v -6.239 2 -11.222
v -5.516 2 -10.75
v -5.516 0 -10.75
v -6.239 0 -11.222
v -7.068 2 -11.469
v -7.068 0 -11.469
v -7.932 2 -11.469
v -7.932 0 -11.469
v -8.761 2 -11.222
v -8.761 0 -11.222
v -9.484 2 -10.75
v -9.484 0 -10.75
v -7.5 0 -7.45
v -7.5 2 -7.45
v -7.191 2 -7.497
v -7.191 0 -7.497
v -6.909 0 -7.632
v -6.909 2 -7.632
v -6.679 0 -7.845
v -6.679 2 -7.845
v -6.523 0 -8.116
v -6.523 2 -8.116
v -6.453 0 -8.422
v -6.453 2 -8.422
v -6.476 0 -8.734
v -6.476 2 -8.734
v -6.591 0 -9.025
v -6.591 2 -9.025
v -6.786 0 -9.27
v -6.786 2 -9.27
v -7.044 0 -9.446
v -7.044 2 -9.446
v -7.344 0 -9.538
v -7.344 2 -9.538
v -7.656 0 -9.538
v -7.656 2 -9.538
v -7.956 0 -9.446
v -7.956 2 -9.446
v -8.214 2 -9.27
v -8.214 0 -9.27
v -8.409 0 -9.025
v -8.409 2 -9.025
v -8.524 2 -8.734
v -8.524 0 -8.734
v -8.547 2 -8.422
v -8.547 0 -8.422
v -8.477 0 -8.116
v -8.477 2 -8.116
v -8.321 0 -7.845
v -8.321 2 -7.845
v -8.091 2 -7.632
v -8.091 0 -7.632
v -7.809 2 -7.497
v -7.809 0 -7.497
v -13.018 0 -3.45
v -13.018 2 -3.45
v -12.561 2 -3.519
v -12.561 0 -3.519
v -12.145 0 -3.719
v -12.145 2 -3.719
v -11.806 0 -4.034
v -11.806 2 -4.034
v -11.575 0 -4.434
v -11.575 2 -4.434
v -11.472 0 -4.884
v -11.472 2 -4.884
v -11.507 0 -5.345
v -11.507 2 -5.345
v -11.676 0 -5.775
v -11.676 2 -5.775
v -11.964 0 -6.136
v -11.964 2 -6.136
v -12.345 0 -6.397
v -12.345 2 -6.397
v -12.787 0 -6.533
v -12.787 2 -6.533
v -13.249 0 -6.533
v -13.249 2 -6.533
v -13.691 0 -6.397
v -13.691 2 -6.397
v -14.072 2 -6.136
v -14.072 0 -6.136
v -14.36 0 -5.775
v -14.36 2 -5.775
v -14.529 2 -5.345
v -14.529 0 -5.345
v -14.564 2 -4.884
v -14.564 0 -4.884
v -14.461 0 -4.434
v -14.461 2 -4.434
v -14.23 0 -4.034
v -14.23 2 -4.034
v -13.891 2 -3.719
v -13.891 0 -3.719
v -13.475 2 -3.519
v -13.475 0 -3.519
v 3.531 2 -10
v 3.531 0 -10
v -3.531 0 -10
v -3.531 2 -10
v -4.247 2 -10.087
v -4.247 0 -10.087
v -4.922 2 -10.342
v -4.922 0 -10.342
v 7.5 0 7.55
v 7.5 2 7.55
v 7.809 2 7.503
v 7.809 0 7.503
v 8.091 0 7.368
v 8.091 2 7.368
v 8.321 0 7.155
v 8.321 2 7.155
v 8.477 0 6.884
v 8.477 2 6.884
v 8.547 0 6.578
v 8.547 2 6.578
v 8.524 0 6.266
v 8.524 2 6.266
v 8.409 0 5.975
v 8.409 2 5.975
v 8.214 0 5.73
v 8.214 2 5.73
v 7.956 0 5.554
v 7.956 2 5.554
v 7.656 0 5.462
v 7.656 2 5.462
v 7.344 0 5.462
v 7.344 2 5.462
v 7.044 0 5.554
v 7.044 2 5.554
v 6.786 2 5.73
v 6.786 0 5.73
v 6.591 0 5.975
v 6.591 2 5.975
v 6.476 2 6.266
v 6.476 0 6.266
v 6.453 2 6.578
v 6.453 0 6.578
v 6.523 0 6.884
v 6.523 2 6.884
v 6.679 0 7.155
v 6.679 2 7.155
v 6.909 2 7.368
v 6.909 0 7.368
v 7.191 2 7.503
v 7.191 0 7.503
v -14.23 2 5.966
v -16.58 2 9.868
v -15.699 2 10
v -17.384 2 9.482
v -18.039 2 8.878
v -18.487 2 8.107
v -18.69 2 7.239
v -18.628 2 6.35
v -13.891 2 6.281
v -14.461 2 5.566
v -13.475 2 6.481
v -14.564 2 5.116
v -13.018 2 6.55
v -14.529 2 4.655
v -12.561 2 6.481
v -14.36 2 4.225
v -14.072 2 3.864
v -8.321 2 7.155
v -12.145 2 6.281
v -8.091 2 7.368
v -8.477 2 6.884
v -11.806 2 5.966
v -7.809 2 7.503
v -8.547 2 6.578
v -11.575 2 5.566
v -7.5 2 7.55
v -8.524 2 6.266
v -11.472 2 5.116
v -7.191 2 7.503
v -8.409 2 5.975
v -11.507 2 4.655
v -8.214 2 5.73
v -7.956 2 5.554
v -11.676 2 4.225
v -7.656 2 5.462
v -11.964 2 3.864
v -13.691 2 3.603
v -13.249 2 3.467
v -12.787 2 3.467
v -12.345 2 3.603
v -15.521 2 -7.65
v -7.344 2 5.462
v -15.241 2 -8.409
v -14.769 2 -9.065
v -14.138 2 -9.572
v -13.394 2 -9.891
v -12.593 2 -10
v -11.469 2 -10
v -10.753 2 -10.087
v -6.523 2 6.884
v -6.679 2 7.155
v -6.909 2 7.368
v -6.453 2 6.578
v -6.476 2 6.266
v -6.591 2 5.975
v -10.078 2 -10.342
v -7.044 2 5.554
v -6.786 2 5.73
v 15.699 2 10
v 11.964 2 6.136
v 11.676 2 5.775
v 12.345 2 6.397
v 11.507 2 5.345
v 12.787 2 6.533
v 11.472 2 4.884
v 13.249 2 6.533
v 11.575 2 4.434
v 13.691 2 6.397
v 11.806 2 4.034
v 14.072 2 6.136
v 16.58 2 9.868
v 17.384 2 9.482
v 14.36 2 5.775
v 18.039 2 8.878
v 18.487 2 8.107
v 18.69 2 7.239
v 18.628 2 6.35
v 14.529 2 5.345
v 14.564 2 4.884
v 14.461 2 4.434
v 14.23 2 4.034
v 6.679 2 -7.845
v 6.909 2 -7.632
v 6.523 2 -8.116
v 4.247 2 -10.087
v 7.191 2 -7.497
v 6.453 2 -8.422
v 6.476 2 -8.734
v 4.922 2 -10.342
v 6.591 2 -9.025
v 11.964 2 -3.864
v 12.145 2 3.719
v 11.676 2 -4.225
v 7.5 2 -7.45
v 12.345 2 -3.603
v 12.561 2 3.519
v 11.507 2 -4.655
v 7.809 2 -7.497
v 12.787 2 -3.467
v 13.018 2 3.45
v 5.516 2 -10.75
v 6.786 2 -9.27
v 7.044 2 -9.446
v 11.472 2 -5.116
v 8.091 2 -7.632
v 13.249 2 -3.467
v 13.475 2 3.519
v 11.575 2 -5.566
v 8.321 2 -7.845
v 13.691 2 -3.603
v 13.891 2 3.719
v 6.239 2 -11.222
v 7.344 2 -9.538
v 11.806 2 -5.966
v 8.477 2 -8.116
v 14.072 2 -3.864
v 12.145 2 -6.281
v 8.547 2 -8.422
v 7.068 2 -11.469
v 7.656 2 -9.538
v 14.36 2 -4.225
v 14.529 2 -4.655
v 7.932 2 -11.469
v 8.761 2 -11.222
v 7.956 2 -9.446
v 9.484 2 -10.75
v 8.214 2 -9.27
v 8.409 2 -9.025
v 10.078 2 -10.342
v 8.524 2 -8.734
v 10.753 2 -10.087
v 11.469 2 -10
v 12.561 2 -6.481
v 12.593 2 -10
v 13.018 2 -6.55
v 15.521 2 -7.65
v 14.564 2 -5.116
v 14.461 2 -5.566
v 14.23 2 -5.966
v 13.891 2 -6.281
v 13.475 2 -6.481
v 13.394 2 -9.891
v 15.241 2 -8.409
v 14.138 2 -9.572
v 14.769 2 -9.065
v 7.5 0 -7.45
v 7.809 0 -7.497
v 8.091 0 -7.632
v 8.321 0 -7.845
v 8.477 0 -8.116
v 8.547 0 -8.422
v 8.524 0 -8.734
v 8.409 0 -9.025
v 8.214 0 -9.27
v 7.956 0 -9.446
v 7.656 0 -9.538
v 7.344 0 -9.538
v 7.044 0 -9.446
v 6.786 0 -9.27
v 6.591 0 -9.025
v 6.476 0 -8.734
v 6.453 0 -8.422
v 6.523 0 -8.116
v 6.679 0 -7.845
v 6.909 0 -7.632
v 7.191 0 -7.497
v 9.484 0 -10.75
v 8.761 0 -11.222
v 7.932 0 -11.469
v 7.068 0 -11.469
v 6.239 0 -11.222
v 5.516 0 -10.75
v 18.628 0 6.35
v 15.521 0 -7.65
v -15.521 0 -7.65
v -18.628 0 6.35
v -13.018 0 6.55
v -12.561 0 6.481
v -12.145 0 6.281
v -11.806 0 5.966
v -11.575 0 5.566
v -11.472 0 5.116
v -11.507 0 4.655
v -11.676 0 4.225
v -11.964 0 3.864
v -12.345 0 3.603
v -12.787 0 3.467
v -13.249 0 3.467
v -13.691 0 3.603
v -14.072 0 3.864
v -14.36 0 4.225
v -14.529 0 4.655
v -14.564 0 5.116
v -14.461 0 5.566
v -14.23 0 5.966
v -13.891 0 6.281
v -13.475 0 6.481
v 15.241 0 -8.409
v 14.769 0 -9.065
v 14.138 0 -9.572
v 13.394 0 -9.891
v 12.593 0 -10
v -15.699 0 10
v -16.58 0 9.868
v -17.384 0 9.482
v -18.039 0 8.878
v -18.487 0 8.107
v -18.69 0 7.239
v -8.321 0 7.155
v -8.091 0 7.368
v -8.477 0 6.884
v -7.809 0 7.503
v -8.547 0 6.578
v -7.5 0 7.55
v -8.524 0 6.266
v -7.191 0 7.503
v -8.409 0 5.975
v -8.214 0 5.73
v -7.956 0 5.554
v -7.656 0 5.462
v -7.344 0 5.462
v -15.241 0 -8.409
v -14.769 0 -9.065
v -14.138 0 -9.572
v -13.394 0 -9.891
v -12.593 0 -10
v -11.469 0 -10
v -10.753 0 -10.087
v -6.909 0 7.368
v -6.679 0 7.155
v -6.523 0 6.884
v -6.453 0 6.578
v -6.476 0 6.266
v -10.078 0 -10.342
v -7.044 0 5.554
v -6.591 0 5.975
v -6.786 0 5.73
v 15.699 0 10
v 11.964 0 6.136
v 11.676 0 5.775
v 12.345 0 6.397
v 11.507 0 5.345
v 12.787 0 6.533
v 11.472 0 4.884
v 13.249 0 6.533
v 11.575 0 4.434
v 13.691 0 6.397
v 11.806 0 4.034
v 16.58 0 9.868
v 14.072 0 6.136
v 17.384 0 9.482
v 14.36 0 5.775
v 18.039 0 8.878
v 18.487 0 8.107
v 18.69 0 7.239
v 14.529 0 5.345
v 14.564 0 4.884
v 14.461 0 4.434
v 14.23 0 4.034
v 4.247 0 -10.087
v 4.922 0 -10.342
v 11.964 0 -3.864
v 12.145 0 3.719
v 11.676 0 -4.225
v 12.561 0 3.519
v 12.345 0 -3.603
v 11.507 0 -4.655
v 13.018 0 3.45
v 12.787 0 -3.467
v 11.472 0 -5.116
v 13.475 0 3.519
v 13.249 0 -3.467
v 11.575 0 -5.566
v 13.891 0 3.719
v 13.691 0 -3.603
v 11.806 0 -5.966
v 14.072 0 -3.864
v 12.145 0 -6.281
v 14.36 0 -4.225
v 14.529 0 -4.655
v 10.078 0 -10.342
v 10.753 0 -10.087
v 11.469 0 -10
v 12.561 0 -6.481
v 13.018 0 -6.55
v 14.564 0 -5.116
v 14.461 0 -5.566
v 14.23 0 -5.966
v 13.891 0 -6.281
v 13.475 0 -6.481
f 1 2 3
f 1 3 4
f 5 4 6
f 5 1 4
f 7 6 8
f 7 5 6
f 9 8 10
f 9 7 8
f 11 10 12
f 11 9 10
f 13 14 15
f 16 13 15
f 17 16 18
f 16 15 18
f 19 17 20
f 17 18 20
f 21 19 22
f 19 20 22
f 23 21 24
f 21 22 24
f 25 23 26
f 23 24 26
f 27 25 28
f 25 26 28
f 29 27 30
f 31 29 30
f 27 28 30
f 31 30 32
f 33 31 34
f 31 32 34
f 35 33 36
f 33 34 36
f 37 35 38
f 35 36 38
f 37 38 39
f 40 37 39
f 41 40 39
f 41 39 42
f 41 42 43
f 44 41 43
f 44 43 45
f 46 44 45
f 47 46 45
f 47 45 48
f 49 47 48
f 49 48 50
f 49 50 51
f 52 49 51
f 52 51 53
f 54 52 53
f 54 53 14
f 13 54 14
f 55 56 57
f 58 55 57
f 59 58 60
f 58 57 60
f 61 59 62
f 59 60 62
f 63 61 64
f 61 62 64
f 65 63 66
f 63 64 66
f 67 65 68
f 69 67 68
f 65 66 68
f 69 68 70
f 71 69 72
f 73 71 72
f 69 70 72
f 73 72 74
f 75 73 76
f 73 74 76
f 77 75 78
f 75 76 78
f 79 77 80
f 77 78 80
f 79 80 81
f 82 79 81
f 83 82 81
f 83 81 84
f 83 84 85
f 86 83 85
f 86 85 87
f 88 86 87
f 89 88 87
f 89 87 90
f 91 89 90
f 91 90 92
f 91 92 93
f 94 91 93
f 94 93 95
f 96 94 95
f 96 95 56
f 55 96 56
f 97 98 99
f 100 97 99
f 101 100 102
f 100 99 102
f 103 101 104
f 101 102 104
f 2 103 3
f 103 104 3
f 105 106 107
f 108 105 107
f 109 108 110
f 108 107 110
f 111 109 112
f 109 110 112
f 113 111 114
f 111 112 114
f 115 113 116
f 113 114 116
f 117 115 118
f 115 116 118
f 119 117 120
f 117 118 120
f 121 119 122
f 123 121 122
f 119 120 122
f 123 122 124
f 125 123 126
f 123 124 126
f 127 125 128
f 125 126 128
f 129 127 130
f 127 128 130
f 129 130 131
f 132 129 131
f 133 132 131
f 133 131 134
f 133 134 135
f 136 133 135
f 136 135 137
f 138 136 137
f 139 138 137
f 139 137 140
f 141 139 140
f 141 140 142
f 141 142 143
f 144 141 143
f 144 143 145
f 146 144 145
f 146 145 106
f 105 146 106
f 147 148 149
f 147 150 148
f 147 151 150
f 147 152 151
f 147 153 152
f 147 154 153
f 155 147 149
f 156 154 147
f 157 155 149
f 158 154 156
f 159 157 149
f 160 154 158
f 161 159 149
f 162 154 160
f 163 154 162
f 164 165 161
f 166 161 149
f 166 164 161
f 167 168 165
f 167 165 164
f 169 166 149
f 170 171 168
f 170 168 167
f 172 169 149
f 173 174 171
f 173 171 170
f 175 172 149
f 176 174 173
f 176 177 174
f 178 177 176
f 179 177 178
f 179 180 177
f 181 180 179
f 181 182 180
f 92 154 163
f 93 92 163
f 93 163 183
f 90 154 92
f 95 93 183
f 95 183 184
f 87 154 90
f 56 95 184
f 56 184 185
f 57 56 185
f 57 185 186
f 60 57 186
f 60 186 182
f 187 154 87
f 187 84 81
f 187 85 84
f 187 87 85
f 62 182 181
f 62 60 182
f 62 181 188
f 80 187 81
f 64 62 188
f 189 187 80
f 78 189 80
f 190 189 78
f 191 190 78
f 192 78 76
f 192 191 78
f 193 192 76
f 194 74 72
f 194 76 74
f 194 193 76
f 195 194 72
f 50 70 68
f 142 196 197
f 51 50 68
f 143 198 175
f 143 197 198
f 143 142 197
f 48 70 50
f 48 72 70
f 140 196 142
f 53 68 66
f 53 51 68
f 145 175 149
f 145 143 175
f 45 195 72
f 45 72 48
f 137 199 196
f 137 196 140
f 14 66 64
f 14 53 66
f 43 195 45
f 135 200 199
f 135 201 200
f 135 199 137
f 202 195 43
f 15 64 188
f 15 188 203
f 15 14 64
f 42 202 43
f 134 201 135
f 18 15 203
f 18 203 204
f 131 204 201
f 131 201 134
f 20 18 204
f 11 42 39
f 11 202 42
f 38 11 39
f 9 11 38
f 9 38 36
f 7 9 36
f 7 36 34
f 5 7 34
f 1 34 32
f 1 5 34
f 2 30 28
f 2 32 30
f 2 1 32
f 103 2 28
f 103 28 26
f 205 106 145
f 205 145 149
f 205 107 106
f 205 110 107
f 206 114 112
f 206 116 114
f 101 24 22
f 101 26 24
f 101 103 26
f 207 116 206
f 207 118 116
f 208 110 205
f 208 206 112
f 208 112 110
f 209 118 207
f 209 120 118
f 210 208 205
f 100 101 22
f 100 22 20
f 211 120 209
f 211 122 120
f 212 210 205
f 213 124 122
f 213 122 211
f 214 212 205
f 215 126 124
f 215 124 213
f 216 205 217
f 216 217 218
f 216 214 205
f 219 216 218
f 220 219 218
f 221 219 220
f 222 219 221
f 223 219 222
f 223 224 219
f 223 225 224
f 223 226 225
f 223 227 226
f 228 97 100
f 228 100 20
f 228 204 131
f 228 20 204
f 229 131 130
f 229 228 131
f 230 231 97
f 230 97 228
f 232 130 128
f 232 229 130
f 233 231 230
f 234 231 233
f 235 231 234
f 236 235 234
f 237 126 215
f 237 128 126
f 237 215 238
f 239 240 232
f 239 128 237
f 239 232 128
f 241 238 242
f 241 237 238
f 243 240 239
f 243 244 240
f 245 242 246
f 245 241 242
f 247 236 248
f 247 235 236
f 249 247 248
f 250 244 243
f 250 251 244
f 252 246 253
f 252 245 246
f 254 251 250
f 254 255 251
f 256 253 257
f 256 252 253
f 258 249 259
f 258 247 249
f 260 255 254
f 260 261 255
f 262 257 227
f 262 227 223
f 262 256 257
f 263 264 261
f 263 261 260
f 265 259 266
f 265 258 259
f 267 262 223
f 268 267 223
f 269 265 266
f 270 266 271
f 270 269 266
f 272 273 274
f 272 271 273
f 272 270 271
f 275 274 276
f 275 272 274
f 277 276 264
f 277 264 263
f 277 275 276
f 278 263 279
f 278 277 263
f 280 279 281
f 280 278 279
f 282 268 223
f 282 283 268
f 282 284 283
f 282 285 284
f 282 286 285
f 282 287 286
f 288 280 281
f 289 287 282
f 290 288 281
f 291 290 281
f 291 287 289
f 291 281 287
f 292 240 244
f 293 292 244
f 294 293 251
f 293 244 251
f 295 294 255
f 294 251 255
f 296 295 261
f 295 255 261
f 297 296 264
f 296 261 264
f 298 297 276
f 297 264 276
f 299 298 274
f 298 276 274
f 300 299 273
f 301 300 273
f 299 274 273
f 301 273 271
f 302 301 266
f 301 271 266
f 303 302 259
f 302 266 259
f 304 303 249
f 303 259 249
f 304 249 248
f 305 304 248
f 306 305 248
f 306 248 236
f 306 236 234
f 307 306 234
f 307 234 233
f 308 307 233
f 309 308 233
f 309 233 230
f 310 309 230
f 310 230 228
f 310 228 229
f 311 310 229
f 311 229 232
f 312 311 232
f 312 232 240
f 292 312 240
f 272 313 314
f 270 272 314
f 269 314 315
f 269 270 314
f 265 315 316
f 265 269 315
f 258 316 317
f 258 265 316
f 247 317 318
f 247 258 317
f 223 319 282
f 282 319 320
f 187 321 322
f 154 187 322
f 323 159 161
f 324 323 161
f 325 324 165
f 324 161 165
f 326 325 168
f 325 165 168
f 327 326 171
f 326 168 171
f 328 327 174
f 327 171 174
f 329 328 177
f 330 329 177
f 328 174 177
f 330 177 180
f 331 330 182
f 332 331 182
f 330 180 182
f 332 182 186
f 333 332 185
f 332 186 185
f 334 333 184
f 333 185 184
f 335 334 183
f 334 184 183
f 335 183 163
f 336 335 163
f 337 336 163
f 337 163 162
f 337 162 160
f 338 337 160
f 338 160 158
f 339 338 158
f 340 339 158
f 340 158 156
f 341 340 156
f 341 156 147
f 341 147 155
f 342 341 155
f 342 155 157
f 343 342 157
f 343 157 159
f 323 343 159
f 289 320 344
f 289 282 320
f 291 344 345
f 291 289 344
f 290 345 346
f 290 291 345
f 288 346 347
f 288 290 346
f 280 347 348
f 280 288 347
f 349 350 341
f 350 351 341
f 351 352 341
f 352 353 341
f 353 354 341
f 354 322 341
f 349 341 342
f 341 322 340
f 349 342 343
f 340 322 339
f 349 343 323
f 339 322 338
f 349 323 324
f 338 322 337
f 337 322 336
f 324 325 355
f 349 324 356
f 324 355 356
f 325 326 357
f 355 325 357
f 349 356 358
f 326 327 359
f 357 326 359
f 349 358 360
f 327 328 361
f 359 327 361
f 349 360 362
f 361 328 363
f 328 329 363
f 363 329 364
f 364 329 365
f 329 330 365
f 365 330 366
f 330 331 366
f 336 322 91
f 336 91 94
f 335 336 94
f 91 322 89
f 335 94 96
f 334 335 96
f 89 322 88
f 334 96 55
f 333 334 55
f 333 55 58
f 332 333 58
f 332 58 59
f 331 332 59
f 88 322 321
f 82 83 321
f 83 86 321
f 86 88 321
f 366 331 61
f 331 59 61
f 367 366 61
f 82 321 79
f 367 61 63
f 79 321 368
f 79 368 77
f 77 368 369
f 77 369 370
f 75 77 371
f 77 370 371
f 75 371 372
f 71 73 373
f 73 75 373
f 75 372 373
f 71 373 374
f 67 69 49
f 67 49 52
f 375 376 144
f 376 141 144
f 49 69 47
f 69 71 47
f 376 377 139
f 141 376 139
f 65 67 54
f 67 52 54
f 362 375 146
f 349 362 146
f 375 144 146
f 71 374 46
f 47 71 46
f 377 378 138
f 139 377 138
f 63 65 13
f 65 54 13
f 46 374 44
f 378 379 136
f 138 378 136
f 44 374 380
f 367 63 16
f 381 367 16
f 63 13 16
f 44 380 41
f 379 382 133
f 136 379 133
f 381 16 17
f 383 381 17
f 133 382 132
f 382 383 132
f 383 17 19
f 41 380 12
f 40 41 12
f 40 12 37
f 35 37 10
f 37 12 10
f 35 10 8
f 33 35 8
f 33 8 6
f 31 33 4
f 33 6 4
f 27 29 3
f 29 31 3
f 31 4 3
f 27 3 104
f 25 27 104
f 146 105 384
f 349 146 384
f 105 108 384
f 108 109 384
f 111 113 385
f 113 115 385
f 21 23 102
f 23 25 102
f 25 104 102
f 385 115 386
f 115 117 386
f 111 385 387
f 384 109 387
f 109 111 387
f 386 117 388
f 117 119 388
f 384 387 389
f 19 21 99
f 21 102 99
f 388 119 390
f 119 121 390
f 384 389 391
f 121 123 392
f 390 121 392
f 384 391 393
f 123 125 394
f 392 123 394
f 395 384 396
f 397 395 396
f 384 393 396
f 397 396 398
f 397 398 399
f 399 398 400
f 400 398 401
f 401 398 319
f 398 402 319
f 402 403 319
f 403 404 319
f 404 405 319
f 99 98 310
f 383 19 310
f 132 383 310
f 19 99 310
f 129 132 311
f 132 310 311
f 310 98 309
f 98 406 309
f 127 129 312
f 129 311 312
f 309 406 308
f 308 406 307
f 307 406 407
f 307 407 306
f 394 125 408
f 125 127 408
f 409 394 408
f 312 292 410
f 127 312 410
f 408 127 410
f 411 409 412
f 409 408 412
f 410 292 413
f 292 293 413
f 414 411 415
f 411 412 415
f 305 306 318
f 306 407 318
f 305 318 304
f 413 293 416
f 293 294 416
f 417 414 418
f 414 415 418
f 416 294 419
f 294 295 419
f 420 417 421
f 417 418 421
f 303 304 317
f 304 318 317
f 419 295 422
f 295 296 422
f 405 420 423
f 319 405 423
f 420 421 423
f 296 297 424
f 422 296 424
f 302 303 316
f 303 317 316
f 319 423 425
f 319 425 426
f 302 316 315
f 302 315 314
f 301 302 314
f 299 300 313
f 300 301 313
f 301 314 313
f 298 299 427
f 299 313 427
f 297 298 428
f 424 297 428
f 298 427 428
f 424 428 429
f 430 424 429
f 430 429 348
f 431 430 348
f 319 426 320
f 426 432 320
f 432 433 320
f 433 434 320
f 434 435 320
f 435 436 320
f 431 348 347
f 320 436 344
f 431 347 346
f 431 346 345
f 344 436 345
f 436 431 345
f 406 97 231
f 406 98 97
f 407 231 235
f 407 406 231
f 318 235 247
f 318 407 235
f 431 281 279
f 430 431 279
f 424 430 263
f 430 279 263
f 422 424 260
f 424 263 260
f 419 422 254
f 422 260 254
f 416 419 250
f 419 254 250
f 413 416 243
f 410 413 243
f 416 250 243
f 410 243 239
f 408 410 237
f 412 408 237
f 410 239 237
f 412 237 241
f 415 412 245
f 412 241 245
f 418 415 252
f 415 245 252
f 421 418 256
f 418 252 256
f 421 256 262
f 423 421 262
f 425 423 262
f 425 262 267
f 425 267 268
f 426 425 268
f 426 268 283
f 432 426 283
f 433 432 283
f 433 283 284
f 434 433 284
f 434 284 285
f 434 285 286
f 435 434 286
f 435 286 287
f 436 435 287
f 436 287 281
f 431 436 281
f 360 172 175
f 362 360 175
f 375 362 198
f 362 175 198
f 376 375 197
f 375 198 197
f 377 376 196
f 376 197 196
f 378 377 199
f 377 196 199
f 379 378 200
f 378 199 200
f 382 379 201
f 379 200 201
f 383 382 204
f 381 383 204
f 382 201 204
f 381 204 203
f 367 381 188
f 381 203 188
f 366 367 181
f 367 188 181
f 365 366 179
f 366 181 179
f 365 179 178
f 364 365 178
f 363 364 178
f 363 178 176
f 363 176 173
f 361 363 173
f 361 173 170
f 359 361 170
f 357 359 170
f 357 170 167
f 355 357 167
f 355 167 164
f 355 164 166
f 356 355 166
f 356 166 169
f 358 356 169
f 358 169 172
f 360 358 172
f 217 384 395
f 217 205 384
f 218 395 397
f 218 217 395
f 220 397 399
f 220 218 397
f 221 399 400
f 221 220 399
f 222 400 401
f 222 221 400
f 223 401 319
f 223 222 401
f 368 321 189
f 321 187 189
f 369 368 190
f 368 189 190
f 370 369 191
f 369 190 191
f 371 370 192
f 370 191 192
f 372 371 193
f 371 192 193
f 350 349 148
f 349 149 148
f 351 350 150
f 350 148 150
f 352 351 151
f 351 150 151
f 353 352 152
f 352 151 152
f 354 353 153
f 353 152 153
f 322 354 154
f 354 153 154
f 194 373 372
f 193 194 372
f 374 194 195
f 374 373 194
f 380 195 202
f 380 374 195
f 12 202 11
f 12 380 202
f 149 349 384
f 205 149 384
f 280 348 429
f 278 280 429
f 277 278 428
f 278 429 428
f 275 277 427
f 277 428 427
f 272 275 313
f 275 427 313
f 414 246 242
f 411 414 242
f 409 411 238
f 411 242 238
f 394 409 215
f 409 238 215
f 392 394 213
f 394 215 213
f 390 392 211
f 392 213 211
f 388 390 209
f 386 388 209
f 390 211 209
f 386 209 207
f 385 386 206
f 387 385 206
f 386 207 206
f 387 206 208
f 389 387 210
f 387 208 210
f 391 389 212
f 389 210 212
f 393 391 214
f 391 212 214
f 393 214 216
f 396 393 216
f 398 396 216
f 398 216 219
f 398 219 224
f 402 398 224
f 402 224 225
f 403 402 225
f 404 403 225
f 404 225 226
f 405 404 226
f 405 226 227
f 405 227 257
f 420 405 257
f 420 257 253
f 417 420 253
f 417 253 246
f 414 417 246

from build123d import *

# Parameters (mm, degrees)
EXTRUDE_1_DEPTH     = 2
SKETCH_2_R          = 1.55
CUT_EXTRUDE_1_DEPTH = 22.950475716
SKETCH_3_R          = 1.05
CUT_EXTRUDE_2_DEPTH = 22.950475716
FILLET_2_R          = 3
EXTRUDE_2_DEPTH     = 2
FILLET_4_R          = 3


with BuildPart() as part:
    # 草图1 → 凸台-拉伸1 (new body)
    with BuildSketch(Plane(origin=(0, 0, 0), x_dir=(1, 0, 0), z_dir=(0, 1, 0))):
        Polygon((-19.437679495, -10), (19.437679495, -10), (15, 10), (-15, 10), align=None)
    extrude(amount=EXTRUDE_1_DEPTH)

    # 草图2 → 切除-拉伸1 (cut, through all)
    with BuildSketch(Plane(origin=(0, 2, 0), x_dir=(1, 0, 0), z_dir=(0, 1, 0))):
        with Locations(Location((-13.01801017, 5, 0), (0, 0, 270))):
            Circle(SKETCH_2_R)
        with Locations(Location((-13.01801017, -5, 0), (0, 0, 270))):
            Circle(SKETCH_2_R)
        with Locations(Location((13.01801017, -5, 0), (0, 0, 90))):
            Circle(SKETCH_2_R)
        with Locations(Location((13.01801017, 5, 0), (0, 0, 90))):
            Circle(SKETCH_2_R)
    extrude(amount=-CUT_EXTRUDE_1_DEPTH, mode=Mode.SUBTRACT)

    # 草图3 → 切除-拉伸2 (cut, through all)
    with BuildSketch(Plane(origin=(0, 2, 0), x_dir=(1, 0, 0), z_dir=(0, 1, 0))):
        with Locations(Location((-7.5, 8.5, 0), (0, 0, 270))):
            Circle(SKETCH_3_R)
        with Locations(Location((-7.5, -6.5, 0), (0, 0, 270))):
            Circle(SKETCH_3_R)
        with Locations(Location((7.5, -6.5, 0), (0, 0, 270))):
            Circle(SKETCH_3_R)
        with Locations(Location((7.5, 8.5, 0), (0, 0, 270))):
            Circle(SKETCH_3_R)
    extrude(amount=-CUT_EXTRUDE_2_DEPTH, mode=Mode.SUBTRACT)

    # 圆角2
    fillet_2_edges = [part.edges().sort_by_distance(p)[0] for p in [
        (-15, 1, -10),
        (15, 1, -10),
        (19.437679495, 1, 10),
        (-19.437679495, 1, 10),
    ]]
    fillet(fillet_2_edges, radius=FILLET_2_R)

    # 草图4 → 凸台-拉伸2 (add)
    with BuildSketch(Plane(origin=(0, 2, 0), x_dir=(1, 0, 0), z_dir=(0, 1, 0))):
        with BuildLine():
            ThreePointArc((-4.901923789, 10), (-7.5, 11.5), (-10.098076211, 10))
            Line((-10.098076211, 10), (-4.901923789, 10))
        make_face()
        with BuildLine():
            ThreePointArc((10.098076211, 10), (7.5, 11.5), (4.901923789, 10))
            Line((4.901923789, 10), (10.098076211, 10))
        make_face()
    extrude(amount=-EXTRUDE_2_DEPTH)

    # 圆角4
    fillet_4_edges = [part.edges().sort_by_distance(p)[0] for p in [
        (10.098076211, 1, -10),
        (4.901923789, 1, -10),
        (-4.901923789, 1, -10),
        (-10.098076211, 1, -10),
    ]]
    fillet(fillet_4_edges, radius=FILLET_4_R)


solid = part.part
